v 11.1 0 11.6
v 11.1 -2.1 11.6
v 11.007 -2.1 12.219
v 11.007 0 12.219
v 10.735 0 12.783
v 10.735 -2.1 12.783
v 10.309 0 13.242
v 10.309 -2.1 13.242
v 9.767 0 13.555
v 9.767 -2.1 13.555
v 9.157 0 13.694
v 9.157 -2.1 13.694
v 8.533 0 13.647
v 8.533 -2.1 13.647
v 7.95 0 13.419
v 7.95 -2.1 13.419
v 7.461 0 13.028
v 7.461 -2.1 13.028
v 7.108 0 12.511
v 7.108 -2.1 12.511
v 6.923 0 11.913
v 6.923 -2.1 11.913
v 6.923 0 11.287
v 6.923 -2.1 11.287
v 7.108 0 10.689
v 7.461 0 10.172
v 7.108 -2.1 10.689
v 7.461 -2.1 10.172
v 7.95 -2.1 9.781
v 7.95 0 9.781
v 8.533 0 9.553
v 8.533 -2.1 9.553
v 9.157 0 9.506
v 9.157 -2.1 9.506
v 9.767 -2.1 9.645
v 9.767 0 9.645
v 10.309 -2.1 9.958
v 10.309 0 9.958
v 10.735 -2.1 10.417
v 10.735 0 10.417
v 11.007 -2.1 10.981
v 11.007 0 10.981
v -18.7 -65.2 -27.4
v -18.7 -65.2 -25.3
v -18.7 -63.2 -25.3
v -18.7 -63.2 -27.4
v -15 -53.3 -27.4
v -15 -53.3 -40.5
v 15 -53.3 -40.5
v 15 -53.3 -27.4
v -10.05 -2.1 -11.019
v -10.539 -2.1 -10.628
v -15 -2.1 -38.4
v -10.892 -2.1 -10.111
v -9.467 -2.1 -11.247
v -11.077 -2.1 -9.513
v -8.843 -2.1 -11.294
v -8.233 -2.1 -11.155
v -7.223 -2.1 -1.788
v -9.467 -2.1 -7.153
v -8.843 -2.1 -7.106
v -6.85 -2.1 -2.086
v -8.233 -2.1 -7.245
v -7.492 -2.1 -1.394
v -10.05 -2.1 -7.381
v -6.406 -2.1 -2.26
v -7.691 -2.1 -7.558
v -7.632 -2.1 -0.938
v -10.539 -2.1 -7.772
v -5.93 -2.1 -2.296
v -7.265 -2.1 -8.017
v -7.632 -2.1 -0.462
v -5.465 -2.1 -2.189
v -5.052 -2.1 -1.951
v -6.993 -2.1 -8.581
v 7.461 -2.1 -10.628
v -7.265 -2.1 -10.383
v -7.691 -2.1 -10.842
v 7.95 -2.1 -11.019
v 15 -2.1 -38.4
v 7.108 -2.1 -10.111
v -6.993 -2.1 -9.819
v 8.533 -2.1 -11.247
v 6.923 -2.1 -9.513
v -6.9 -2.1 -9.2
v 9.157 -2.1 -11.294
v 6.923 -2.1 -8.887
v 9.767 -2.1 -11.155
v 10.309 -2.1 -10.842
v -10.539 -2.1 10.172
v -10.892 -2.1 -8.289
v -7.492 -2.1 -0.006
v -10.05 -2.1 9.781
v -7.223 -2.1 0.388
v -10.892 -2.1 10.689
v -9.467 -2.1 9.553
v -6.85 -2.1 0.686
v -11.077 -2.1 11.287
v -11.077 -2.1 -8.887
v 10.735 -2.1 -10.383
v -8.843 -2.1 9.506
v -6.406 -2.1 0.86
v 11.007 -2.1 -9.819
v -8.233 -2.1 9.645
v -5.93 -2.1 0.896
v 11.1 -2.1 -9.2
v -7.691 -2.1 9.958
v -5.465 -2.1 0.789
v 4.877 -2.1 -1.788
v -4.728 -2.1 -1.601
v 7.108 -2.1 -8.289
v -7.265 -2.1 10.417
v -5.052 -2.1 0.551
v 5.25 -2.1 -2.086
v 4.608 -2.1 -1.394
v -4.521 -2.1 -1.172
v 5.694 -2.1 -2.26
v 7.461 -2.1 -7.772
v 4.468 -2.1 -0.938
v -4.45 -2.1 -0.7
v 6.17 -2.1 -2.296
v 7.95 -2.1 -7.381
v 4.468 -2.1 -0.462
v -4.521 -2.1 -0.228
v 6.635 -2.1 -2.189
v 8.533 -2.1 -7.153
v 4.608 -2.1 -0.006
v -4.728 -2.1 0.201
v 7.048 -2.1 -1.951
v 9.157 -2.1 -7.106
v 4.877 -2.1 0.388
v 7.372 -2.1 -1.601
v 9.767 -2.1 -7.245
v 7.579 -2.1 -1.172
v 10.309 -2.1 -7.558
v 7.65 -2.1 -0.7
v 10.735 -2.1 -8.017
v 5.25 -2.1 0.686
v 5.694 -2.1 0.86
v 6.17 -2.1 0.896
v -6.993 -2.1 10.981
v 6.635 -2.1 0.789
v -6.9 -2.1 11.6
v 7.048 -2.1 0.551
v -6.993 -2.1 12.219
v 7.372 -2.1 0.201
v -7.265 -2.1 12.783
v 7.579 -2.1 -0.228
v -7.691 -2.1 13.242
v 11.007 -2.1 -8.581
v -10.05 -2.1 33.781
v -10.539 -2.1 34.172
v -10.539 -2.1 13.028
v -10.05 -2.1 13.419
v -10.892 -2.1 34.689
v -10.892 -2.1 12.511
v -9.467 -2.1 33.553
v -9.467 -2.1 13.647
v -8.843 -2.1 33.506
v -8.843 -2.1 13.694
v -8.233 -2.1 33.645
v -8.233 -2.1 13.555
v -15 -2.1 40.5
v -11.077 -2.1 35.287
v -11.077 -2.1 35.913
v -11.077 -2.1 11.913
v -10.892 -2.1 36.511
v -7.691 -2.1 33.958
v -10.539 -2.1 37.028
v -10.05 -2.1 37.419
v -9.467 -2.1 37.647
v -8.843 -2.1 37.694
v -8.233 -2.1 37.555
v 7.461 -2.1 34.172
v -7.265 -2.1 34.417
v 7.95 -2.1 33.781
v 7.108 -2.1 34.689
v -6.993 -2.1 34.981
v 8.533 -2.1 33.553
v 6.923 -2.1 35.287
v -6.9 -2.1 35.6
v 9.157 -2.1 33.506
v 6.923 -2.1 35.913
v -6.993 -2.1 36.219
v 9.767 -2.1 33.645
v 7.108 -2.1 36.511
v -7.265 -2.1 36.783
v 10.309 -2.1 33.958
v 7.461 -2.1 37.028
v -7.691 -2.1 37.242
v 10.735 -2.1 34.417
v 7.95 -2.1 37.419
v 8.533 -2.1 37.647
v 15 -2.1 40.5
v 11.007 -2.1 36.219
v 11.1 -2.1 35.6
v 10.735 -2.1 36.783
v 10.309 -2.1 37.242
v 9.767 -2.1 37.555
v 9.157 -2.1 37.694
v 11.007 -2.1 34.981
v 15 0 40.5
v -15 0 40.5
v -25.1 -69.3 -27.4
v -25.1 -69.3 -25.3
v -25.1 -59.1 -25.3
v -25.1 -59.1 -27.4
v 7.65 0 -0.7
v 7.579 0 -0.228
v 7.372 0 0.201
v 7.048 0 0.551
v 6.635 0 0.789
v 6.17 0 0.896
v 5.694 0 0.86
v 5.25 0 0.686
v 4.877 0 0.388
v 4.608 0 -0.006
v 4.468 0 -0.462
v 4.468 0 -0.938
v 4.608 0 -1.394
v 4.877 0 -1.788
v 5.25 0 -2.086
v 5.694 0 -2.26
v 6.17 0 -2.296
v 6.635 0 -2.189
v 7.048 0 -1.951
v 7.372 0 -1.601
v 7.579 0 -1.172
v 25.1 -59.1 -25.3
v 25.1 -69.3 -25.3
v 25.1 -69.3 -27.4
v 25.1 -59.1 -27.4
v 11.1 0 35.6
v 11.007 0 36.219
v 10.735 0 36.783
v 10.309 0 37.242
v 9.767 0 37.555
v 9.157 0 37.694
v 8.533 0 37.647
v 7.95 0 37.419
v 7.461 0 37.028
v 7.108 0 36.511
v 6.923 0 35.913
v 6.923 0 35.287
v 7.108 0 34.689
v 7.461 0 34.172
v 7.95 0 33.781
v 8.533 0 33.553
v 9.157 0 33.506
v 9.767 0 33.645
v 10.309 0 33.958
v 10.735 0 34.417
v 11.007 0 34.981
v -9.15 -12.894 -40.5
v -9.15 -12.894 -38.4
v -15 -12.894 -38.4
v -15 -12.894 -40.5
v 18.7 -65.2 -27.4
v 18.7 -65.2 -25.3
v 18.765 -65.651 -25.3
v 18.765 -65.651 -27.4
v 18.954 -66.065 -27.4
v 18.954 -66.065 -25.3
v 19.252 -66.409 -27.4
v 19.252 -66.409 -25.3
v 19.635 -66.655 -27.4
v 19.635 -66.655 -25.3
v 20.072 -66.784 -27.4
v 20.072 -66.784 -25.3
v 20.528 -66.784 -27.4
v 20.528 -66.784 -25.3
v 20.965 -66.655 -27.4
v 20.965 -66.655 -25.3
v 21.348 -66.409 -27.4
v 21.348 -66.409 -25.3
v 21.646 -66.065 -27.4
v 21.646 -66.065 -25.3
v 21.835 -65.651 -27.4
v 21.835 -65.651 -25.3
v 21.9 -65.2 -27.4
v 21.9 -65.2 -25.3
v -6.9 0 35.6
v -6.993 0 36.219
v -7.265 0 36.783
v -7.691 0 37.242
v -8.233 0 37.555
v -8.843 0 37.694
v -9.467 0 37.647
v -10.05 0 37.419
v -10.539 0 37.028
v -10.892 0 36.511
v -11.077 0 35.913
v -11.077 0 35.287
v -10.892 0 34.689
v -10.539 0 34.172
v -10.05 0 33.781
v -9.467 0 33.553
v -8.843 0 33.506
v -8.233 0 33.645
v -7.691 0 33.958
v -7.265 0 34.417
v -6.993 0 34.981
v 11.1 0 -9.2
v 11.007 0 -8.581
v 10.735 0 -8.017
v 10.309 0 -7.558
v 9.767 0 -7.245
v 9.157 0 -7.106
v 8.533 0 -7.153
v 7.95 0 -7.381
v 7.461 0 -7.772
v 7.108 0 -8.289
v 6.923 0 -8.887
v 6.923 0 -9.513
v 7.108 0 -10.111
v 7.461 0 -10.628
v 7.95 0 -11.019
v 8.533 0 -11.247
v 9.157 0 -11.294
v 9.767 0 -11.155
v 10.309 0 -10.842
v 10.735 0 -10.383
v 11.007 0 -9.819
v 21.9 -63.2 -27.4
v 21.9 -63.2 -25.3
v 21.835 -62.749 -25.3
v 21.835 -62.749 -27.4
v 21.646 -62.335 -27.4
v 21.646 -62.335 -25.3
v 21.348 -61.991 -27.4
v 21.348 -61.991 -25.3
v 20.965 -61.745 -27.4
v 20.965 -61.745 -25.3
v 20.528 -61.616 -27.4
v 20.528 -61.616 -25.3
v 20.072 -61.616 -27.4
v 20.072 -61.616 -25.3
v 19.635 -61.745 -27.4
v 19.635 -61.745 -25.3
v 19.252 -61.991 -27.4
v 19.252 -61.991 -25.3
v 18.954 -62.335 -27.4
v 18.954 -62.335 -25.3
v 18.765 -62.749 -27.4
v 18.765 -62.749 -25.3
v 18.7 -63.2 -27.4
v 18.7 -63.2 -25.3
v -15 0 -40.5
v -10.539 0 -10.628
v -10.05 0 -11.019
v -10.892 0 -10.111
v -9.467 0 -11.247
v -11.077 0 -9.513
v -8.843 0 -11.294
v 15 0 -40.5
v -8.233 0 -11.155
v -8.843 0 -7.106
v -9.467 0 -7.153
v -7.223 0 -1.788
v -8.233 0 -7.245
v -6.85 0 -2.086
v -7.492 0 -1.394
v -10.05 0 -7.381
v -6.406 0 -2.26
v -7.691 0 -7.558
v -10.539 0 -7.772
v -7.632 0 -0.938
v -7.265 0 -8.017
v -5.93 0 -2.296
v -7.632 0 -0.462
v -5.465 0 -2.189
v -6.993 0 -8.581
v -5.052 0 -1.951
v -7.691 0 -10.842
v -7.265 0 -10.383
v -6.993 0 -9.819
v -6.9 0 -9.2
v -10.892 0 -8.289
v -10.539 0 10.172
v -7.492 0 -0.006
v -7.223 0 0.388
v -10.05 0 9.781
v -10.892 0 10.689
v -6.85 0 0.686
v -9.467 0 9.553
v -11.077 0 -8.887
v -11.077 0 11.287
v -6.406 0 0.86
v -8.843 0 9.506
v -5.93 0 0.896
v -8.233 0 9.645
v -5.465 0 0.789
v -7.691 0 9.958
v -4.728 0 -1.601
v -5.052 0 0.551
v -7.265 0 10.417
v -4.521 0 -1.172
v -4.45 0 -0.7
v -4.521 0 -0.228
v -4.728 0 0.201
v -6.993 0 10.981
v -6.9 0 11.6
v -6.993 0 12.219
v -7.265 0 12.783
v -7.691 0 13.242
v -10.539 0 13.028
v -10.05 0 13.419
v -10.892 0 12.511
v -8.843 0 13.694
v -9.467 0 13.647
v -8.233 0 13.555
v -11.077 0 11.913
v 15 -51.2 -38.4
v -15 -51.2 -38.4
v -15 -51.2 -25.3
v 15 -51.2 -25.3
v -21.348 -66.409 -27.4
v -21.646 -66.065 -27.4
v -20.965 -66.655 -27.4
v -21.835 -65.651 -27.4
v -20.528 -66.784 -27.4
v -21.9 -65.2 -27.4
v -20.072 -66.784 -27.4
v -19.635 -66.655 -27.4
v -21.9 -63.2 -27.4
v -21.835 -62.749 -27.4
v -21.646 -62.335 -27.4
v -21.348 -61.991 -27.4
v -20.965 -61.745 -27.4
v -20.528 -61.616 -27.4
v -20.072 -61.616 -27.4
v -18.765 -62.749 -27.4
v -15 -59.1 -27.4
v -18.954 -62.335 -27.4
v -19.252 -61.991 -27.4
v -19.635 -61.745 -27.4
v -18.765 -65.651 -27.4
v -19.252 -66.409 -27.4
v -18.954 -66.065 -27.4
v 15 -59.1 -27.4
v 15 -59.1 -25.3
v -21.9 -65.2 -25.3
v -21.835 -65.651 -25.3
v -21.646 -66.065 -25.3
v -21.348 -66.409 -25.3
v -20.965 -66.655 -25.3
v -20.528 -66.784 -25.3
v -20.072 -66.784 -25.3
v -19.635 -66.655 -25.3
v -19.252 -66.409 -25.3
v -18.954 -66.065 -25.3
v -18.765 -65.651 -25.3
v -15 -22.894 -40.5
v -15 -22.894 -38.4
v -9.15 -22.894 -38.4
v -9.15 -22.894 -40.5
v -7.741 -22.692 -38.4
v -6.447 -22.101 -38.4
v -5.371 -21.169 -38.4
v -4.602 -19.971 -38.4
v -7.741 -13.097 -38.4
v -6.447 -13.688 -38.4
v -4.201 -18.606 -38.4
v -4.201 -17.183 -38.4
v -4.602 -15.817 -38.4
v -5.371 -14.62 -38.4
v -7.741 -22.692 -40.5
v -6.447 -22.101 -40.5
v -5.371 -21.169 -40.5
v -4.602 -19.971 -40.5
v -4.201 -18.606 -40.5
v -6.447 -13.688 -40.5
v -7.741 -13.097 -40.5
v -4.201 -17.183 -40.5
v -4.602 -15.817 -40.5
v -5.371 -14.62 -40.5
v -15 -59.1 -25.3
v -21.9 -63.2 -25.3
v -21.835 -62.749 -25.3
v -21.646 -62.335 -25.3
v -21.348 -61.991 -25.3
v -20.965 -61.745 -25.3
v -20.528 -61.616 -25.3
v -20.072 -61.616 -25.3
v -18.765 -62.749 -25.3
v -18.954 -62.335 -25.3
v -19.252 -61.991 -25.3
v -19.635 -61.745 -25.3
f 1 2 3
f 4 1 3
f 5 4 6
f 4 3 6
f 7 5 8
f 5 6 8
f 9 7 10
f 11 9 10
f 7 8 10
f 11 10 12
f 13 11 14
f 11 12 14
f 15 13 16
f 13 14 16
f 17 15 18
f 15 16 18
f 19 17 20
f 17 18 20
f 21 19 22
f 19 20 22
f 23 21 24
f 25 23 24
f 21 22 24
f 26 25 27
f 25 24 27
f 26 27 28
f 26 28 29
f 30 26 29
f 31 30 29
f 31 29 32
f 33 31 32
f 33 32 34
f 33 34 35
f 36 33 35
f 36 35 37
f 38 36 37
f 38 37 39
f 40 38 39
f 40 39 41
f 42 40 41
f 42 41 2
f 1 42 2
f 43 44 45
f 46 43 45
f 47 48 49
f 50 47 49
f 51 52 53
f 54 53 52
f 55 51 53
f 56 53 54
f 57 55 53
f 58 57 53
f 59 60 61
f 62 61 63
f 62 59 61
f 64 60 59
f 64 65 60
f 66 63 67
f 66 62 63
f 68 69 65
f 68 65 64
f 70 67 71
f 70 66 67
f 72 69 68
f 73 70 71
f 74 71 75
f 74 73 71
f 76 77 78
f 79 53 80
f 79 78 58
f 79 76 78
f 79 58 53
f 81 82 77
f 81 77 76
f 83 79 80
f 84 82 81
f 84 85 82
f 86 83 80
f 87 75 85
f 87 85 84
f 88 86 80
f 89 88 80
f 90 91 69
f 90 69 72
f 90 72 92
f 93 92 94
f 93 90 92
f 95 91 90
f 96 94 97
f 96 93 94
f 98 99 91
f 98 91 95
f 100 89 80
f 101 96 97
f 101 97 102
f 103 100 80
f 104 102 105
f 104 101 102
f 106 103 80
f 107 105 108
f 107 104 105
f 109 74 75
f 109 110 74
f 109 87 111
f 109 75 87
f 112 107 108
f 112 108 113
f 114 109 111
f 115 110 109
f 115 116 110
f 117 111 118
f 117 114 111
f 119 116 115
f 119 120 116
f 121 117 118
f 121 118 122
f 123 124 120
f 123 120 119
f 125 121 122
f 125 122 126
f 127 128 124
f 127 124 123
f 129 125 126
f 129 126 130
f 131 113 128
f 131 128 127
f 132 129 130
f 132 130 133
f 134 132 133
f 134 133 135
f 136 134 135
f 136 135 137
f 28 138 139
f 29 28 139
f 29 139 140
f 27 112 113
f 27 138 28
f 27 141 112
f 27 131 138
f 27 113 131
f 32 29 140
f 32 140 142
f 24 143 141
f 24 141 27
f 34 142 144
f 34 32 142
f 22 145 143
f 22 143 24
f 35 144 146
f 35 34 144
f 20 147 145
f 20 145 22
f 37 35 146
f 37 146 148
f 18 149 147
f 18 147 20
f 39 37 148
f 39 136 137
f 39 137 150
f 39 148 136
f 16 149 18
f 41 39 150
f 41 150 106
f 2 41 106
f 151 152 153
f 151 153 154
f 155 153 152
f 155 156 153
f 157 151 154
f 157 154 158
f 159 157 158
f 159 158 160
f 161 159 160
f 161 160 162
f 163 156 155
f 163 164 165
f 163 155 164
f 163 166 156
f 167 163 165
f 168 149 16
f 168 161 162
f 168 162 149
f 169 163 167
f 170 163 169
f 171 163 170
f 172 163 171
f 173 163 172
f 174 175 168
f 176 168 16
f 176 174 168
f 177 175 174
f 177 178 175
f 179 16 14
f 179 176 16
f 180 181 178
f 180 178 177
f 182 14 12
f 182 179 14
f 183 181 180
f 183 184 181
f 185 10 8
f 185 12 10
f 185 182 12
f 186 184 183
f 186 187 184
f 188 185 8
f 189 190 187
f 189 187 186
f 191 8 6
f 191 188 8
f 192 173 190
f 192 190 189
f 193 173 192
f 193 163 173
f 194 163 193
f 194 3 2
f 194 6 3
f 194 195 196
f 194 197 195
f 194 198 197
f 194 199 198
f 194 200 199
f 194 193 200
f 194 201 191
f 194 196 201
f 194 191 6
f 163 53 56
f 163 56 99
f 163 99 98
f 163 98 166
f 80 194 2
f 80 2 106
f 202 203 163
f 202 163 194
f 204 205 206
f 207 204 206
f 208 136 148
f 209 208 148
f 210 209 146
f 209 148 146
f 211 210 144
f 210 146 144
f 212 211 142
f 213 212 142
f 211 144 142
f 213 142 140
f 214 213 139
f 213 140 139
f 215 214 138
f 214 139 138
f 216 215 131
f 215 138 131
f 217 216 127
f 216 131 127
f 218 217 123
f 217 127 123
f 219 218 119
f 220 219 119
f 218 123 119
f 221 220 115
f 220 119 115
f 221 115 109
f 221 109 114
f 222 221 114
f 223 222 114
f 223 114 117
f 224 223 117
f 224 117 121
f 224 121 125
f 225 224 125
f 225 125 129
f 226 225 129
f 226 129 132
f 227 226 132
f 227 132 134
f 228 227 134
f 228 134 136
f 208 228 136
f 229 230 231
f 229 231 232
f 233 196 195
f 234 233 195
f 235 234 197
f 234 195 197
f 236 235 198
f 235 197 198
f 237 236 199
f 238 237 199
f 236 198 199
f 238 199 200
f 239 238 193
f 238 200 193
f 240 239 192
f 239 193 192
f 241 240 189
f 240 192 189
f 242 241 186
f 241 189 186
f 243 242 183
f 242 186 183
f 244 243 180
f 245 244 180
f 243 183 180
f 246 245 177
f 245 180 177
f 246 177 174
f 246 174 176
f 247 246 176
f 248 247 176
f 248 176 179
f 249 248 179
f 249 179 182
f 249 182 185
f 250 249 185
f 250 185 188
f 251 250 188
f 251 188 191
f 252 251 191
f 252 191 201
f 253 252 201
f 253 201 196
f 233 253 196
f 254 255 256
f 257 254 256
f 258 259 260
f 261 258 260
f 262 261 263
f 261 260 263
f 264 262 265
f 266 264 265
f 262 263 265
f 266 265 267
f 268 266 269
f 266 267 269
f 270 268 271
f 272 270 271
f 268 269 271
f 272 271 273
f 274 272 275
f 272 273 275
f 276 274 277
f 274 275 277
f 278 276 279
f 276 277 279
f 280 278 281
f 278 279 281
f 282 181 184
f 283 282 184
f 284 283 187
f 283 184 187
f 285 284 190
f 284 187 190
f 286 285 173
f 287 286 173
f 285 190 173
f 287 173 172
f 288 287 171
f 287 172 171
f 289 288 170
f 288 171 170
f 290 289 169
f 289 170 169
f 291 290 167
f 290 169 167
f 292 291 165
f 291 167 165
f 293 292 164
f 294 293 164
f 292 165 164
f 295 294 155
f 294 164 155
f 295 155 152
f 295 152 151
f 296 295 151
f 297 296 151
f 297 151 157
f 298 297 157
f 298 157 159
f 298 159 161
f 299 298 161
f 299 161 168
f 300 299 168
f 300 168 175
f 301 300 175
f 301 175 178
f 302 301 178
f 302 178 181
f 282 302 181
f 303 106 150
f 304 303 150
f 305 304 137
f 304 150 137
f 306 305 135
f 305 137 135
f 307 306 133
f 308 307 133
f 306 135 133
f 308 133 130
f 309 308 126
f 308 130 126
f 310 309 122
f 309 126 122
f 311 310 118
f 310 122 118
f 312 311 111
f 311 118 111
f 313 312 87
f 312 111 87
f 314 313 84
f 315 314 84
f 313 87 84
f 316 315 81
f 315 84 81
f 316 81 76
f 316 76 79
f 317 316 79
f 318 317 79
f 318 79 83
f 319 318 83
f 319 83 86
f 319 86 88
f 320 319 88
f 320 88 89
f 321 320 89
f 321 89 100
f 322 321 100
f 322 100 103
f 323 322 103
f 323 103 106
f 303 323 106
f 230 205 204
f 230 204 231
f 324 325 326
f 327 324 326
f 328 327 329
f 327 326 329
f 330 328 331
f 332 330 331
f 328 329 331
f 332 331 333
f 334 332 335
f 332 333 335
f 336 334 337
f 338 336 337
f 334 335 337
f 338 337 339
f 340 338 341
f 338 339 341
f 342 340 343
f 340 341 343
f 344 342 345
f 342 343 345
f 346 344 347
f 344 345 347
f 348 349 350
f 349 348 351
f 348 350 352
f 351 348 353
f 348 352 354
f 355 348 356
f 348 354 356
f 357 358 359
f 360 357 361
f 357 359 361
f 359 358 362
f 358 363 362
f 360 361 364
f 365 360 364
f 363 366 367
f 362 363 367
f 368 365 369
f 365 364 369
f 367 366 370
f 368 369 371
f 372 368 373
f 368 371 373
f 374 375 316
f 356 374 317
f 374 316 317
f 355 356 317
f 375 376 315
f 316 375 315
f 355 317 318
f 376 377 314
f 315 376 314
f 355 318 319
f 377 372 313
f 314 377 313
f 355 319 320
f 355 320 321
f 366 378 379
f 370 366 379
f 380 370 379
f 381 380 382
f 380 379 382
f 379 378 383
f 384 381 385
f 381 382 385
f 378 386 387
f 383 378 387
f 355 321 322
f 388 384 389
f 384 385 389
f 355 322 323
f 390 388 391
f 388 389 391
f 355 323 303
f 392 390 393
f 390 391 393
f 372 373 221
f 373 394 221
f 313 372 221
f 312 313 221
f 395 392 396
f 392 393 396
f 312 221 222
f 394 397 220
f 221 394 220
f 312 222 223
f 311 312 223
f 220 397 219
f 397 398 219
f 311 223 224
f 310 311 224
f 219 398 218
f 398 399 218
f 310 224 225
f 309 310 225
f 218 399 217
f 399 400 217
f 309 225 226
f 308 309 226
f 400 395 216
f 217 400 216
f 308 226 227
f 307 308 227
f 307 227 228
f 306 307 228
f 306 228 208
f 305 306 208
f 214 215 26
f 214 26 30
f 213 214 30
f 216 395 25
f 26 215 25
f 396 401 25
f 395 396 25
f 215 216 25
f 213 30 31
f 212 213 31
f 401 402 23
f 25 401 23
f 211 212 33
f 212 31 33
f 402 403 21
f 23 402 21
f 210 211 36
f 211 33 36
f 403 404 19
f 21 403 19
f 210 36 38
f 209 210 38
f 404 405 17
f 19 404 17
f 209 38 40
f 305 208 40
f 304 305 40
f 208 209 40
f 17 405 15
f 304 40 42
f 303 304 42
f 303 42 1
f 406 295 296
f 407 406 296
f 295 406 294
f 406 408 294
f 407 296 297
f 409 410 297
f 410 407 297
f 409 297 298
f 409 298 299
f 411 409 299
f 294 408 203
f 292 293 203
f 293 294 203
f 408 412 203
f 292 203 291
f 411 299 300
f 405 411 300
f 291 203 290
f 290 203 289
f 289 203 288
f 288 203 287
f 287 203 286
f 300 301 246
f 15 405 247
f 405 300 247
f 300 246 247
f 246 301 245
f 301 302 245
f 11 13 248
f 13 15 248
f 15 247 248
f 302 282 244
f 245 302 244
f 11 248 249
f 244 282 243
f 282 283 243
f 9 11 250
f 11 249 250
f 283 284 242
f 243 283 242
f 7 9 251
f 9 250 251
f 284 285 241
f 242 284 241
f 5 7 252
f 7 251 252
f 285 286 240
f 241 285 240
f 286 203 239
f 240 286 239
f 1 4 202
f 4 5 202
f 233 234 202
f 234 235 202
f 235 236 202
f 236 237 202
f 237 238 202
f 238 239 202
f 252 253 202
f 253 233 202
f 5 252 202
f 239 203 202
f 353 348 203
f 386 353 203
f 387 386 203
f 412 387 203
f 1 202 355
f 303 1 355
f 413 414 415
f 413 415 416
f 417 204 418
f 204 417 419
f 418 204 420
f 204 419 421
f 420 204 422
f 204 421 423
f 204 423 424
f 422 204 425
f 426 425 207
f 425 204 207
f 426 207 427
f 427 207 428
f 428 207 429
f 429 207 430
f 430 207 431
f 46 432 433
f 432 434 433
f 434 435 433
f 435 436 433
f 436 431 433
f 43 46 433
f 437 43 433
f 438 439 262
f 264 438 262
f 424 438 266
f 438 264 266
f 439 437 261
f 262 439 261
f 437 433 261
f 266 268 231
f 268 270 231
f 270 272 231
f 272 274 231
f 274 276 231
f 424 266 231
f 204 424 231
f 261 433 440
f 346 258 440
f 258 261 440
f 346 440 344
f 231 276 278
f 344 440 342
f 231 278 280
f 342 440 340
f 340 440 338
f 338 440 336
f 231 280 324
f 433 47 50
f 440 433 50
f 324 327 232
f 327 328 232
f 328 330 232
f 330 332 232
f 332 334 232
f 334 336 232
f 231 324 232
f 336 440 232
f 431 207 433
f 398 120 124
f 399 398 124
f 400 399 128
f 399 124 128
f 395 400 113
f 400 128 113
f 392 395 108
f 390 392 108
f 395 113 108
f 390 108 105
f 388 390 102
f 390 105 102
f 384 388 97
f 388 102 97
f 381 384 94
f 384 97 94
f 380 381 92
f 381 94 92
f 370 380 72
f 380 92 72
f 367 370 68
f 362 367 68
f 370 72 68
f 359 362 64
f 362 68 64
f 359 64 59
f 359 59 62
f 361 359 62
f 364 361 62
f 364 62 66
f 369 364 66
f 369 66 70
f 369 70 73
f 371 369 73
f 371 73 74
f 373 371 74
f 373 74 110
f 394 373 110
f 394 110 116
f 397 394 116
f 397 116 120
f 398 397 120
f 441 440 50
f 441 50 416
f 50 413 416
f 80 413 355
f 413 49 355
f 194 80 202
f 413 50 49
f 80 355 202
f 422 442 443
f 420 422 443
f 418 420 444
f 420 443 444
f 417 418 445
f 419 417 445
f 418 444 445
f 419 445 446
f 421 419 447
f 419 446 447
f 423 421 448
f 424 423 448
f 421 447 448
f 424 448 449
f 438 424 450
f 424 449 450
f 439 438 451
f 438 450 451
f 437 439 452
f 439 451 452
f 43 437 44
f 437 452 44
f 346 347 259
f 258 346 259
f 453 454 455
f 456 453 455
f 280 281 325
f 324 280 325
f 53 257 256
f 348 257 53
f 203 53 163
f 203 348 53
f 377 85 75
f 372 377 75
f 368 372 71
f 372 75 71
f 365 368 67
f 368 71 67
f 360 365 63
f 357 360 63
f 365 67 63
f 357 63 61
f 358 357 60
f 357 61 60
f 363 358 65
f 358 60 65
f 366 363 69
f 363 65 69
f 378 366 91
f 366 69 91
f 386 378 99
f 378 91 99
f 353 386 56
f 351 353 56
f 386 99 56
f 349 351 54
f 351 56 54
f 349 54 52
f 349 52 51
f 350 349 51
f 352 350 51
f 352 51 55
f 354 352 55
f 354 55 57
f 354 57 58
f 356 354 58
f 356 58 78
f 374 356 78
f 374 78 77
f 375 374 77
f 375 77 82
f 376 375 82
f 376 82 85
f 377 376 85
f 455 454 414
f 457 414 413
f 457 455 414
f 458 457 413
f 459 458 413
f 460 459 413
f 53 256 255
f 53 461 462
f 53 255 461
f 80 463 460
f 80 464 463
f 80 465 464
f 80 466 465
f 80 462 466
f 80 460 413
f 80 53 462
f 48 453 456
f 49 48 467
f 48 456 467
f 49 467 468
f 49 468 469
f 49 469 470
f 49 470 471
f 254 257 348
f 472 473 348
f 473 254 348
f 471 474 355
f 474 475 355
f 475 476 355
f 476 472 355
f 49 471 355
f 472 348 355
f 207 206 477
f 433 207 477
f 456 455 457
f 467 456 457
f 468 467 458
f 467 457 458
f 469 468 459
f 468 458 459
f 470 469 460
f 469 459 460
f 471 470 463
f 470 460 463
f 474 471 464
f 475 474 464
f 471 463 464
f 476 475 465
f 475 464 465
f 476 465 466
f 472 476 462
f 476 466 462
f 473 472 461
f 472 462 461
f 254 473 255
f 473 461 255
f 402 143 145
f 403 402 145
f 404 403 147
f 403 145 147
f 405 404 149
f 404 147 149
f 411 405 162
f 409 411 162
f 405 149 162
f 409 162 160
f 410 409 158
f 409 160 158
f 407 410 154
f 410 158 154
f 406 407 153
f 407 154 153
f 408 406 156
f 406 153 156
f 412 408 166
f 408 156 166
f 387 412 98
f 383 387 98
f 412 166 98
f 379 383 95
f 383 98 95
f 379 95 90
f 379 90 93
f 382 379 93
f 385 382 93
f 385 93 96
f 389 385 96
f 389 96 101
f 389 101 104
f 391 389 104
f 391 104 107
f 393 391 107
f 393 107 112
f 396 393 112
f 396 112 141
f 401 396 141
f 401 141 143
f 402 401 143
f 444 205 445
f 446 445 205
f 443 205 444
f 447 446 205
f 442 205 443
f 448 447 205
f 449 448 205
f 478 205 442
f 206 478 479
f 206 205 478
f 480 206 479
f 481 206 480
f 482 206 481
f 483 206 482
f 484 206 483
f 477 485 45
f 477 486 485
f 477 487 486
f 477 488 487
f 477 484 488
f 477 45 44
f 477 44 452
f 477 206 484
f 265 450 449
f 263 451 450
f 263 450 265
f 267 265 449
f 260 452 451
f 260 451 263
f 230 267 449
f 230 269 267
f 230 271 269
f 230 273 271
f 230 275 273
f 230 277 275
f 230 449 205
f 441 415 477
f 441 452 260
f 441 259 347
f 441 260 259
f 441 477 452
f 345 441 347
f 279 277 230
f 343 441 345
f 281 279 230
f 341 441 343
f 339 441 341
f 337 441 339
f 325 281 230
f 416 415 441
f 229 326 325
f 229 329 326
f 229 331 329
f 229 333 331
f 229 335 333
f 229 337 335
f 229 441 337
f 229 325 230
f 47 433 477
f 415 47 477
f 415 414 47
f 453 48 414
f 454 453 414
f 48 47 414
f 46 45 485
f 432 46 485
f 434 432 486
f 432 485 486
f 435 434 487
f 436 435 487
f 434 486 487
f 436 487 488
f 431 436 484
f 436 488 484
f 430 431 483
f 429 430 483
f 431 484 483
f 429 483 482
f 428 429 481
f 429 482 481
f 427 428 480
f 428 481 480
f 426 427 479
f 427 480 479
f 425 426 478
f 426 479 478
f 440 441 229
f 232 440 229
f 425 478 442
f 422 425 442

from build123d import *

# Parameters (mm, degrees)
F0_W      = 30
F0_H      = 81
F1_DEPTH  = 2.1
F2_W      = 30
F2_H      = 2.1
F3_DEPTH  = 51.2
F4_W      = 30
F4_H      = 2.1
F5_DEPTH  = 13.1
F6_W      = 30
F6_H      = 2.1
F7_DEPTH  = 16
F8_W      = 10.1
F8_H      = 10.2
F9_DEPTH  = 2.1
F11_DEPTH = 15.201
F13_DEPTH = 2.101
F14_R     = 2.1
F14_R_2   = 1.6
F15_DEPTH = 2.101


with BuildPart() as f1:
    # F0 (on Front) → F1 (new body)
    with BuildSketch(Plane.XZ):
        Rectangle(F0_W, F0_H)
    extrude(amount=F1_DEPTH)

    # F2 (on face) → F3 (join)
    with BuildSketch(Plane.XZ.offset(2.1)):
        with Locations((0, -39.45)):
            Rectangle(F2_W, F2_H)
    extrude(amount=F3_DEPTH)

    # F4 (on face) → F5 (join)
    with BuildSketch(Plane.XY.offset(-38.4)):
        with Locations((0, -52.25)):
            Rectangle(F4_W, F4_H)
    extrude(amount=F5_DEPTH)

    # F6 (on face) → F7 (join)
    with BuildSketch(Plane.XZ.offset(53.3)):
        with Locations((0, -26.35)):
            Rectangle(F6_W, F6_H)
    extrude(amount=F7_DEPTH)

    # F8 (on face) → F9 (join)
    with BuildSketch(Plane.XY.offset(-25.3)):
        with Locations((-20.05, -64.2)):
            Rectangle(F8_W, F8_H)
        with Locations((20.05, -64.2)):
            Rectangle(F8_W, F8_H)
    extrude(amount=-F9_DEPTH)

    # F10 (on face) → F11 (cut, through all)
    with BuildSketch(Plane.XY.offset(-25.3)):
        with BuildLine():
            Line((-21.9, -63.2), (-21.9, -65.2))
            ThreePointArc((-21.9, -65.2), (-20.3, -66.8), (-18.7, -65.2))
            Line((-18.7, -65.2), (-18.7, -63.2))
            ThreePointArc((-18.7, -63.2), (-20.3, -61.6), (-21.9, -63.2))
        make_face()
        with BuildLine():
            Line((18.7, -63.2), (18.7, -65.2))
            ThreePointArc((18.7, -65.2), (20.3, -66.8), (21.9, -65.2))
            Line((21.9, -65.2), (21.9, -63.2))
            ThreePointArc((21.9, -63.2), (20.3, -61.6), (18.7, -63.2))
        make_face()
    extrude(amount=-F11_DEPTH, mode=Mode.SUBTRACT)

    # F12 (on face) → F13 (cut, through all)
    with BuildSketch(Plane.XY.offset(-38.4)):
        with BuildLine():
            Line((-15, -22.894339), (-9.15, -22.894339))
            ThreePointArc((-9.15, -22.894339), (-4.15, -17.894339), (-9.15, -12.894339))
            Line((-9.15, -12.894339), (-15, -12.894339))
            Line((-15, -12.894339), (-15, -22.894339))
        make_face()
    extrude(amount=-F13_DEPTH, mode=Mode.SUBTRACT)

    # F14 (on face) → F15 (cut, through all)
    with BuildSketch(Plane.XZ.offset(2.1)):
        with Locations((9, 35.6)):
            Circle(F14_R)
        with Locations((9, 11.6)):
            Circle(F14_R)
        with Locations((-9, 35.6)):
            Circle(F14_R)
        with Locations((-9, 11.6)):
            Circle(F14_R)
        with Locations((9, -9.2)):
            Circle(F14_R)
        with Locations((-9, -9.2)):
            Circle(F14_R)
        with Locations((6.05, -0.7)):
            Circle(F14_R_2)
        with Locations((-6.05, -0.7)):
            Circle(F14_R_2)
    extrude(amount=-F15_DEPTH, mode=Mode.SUBTRACT)


solid = f1.part
